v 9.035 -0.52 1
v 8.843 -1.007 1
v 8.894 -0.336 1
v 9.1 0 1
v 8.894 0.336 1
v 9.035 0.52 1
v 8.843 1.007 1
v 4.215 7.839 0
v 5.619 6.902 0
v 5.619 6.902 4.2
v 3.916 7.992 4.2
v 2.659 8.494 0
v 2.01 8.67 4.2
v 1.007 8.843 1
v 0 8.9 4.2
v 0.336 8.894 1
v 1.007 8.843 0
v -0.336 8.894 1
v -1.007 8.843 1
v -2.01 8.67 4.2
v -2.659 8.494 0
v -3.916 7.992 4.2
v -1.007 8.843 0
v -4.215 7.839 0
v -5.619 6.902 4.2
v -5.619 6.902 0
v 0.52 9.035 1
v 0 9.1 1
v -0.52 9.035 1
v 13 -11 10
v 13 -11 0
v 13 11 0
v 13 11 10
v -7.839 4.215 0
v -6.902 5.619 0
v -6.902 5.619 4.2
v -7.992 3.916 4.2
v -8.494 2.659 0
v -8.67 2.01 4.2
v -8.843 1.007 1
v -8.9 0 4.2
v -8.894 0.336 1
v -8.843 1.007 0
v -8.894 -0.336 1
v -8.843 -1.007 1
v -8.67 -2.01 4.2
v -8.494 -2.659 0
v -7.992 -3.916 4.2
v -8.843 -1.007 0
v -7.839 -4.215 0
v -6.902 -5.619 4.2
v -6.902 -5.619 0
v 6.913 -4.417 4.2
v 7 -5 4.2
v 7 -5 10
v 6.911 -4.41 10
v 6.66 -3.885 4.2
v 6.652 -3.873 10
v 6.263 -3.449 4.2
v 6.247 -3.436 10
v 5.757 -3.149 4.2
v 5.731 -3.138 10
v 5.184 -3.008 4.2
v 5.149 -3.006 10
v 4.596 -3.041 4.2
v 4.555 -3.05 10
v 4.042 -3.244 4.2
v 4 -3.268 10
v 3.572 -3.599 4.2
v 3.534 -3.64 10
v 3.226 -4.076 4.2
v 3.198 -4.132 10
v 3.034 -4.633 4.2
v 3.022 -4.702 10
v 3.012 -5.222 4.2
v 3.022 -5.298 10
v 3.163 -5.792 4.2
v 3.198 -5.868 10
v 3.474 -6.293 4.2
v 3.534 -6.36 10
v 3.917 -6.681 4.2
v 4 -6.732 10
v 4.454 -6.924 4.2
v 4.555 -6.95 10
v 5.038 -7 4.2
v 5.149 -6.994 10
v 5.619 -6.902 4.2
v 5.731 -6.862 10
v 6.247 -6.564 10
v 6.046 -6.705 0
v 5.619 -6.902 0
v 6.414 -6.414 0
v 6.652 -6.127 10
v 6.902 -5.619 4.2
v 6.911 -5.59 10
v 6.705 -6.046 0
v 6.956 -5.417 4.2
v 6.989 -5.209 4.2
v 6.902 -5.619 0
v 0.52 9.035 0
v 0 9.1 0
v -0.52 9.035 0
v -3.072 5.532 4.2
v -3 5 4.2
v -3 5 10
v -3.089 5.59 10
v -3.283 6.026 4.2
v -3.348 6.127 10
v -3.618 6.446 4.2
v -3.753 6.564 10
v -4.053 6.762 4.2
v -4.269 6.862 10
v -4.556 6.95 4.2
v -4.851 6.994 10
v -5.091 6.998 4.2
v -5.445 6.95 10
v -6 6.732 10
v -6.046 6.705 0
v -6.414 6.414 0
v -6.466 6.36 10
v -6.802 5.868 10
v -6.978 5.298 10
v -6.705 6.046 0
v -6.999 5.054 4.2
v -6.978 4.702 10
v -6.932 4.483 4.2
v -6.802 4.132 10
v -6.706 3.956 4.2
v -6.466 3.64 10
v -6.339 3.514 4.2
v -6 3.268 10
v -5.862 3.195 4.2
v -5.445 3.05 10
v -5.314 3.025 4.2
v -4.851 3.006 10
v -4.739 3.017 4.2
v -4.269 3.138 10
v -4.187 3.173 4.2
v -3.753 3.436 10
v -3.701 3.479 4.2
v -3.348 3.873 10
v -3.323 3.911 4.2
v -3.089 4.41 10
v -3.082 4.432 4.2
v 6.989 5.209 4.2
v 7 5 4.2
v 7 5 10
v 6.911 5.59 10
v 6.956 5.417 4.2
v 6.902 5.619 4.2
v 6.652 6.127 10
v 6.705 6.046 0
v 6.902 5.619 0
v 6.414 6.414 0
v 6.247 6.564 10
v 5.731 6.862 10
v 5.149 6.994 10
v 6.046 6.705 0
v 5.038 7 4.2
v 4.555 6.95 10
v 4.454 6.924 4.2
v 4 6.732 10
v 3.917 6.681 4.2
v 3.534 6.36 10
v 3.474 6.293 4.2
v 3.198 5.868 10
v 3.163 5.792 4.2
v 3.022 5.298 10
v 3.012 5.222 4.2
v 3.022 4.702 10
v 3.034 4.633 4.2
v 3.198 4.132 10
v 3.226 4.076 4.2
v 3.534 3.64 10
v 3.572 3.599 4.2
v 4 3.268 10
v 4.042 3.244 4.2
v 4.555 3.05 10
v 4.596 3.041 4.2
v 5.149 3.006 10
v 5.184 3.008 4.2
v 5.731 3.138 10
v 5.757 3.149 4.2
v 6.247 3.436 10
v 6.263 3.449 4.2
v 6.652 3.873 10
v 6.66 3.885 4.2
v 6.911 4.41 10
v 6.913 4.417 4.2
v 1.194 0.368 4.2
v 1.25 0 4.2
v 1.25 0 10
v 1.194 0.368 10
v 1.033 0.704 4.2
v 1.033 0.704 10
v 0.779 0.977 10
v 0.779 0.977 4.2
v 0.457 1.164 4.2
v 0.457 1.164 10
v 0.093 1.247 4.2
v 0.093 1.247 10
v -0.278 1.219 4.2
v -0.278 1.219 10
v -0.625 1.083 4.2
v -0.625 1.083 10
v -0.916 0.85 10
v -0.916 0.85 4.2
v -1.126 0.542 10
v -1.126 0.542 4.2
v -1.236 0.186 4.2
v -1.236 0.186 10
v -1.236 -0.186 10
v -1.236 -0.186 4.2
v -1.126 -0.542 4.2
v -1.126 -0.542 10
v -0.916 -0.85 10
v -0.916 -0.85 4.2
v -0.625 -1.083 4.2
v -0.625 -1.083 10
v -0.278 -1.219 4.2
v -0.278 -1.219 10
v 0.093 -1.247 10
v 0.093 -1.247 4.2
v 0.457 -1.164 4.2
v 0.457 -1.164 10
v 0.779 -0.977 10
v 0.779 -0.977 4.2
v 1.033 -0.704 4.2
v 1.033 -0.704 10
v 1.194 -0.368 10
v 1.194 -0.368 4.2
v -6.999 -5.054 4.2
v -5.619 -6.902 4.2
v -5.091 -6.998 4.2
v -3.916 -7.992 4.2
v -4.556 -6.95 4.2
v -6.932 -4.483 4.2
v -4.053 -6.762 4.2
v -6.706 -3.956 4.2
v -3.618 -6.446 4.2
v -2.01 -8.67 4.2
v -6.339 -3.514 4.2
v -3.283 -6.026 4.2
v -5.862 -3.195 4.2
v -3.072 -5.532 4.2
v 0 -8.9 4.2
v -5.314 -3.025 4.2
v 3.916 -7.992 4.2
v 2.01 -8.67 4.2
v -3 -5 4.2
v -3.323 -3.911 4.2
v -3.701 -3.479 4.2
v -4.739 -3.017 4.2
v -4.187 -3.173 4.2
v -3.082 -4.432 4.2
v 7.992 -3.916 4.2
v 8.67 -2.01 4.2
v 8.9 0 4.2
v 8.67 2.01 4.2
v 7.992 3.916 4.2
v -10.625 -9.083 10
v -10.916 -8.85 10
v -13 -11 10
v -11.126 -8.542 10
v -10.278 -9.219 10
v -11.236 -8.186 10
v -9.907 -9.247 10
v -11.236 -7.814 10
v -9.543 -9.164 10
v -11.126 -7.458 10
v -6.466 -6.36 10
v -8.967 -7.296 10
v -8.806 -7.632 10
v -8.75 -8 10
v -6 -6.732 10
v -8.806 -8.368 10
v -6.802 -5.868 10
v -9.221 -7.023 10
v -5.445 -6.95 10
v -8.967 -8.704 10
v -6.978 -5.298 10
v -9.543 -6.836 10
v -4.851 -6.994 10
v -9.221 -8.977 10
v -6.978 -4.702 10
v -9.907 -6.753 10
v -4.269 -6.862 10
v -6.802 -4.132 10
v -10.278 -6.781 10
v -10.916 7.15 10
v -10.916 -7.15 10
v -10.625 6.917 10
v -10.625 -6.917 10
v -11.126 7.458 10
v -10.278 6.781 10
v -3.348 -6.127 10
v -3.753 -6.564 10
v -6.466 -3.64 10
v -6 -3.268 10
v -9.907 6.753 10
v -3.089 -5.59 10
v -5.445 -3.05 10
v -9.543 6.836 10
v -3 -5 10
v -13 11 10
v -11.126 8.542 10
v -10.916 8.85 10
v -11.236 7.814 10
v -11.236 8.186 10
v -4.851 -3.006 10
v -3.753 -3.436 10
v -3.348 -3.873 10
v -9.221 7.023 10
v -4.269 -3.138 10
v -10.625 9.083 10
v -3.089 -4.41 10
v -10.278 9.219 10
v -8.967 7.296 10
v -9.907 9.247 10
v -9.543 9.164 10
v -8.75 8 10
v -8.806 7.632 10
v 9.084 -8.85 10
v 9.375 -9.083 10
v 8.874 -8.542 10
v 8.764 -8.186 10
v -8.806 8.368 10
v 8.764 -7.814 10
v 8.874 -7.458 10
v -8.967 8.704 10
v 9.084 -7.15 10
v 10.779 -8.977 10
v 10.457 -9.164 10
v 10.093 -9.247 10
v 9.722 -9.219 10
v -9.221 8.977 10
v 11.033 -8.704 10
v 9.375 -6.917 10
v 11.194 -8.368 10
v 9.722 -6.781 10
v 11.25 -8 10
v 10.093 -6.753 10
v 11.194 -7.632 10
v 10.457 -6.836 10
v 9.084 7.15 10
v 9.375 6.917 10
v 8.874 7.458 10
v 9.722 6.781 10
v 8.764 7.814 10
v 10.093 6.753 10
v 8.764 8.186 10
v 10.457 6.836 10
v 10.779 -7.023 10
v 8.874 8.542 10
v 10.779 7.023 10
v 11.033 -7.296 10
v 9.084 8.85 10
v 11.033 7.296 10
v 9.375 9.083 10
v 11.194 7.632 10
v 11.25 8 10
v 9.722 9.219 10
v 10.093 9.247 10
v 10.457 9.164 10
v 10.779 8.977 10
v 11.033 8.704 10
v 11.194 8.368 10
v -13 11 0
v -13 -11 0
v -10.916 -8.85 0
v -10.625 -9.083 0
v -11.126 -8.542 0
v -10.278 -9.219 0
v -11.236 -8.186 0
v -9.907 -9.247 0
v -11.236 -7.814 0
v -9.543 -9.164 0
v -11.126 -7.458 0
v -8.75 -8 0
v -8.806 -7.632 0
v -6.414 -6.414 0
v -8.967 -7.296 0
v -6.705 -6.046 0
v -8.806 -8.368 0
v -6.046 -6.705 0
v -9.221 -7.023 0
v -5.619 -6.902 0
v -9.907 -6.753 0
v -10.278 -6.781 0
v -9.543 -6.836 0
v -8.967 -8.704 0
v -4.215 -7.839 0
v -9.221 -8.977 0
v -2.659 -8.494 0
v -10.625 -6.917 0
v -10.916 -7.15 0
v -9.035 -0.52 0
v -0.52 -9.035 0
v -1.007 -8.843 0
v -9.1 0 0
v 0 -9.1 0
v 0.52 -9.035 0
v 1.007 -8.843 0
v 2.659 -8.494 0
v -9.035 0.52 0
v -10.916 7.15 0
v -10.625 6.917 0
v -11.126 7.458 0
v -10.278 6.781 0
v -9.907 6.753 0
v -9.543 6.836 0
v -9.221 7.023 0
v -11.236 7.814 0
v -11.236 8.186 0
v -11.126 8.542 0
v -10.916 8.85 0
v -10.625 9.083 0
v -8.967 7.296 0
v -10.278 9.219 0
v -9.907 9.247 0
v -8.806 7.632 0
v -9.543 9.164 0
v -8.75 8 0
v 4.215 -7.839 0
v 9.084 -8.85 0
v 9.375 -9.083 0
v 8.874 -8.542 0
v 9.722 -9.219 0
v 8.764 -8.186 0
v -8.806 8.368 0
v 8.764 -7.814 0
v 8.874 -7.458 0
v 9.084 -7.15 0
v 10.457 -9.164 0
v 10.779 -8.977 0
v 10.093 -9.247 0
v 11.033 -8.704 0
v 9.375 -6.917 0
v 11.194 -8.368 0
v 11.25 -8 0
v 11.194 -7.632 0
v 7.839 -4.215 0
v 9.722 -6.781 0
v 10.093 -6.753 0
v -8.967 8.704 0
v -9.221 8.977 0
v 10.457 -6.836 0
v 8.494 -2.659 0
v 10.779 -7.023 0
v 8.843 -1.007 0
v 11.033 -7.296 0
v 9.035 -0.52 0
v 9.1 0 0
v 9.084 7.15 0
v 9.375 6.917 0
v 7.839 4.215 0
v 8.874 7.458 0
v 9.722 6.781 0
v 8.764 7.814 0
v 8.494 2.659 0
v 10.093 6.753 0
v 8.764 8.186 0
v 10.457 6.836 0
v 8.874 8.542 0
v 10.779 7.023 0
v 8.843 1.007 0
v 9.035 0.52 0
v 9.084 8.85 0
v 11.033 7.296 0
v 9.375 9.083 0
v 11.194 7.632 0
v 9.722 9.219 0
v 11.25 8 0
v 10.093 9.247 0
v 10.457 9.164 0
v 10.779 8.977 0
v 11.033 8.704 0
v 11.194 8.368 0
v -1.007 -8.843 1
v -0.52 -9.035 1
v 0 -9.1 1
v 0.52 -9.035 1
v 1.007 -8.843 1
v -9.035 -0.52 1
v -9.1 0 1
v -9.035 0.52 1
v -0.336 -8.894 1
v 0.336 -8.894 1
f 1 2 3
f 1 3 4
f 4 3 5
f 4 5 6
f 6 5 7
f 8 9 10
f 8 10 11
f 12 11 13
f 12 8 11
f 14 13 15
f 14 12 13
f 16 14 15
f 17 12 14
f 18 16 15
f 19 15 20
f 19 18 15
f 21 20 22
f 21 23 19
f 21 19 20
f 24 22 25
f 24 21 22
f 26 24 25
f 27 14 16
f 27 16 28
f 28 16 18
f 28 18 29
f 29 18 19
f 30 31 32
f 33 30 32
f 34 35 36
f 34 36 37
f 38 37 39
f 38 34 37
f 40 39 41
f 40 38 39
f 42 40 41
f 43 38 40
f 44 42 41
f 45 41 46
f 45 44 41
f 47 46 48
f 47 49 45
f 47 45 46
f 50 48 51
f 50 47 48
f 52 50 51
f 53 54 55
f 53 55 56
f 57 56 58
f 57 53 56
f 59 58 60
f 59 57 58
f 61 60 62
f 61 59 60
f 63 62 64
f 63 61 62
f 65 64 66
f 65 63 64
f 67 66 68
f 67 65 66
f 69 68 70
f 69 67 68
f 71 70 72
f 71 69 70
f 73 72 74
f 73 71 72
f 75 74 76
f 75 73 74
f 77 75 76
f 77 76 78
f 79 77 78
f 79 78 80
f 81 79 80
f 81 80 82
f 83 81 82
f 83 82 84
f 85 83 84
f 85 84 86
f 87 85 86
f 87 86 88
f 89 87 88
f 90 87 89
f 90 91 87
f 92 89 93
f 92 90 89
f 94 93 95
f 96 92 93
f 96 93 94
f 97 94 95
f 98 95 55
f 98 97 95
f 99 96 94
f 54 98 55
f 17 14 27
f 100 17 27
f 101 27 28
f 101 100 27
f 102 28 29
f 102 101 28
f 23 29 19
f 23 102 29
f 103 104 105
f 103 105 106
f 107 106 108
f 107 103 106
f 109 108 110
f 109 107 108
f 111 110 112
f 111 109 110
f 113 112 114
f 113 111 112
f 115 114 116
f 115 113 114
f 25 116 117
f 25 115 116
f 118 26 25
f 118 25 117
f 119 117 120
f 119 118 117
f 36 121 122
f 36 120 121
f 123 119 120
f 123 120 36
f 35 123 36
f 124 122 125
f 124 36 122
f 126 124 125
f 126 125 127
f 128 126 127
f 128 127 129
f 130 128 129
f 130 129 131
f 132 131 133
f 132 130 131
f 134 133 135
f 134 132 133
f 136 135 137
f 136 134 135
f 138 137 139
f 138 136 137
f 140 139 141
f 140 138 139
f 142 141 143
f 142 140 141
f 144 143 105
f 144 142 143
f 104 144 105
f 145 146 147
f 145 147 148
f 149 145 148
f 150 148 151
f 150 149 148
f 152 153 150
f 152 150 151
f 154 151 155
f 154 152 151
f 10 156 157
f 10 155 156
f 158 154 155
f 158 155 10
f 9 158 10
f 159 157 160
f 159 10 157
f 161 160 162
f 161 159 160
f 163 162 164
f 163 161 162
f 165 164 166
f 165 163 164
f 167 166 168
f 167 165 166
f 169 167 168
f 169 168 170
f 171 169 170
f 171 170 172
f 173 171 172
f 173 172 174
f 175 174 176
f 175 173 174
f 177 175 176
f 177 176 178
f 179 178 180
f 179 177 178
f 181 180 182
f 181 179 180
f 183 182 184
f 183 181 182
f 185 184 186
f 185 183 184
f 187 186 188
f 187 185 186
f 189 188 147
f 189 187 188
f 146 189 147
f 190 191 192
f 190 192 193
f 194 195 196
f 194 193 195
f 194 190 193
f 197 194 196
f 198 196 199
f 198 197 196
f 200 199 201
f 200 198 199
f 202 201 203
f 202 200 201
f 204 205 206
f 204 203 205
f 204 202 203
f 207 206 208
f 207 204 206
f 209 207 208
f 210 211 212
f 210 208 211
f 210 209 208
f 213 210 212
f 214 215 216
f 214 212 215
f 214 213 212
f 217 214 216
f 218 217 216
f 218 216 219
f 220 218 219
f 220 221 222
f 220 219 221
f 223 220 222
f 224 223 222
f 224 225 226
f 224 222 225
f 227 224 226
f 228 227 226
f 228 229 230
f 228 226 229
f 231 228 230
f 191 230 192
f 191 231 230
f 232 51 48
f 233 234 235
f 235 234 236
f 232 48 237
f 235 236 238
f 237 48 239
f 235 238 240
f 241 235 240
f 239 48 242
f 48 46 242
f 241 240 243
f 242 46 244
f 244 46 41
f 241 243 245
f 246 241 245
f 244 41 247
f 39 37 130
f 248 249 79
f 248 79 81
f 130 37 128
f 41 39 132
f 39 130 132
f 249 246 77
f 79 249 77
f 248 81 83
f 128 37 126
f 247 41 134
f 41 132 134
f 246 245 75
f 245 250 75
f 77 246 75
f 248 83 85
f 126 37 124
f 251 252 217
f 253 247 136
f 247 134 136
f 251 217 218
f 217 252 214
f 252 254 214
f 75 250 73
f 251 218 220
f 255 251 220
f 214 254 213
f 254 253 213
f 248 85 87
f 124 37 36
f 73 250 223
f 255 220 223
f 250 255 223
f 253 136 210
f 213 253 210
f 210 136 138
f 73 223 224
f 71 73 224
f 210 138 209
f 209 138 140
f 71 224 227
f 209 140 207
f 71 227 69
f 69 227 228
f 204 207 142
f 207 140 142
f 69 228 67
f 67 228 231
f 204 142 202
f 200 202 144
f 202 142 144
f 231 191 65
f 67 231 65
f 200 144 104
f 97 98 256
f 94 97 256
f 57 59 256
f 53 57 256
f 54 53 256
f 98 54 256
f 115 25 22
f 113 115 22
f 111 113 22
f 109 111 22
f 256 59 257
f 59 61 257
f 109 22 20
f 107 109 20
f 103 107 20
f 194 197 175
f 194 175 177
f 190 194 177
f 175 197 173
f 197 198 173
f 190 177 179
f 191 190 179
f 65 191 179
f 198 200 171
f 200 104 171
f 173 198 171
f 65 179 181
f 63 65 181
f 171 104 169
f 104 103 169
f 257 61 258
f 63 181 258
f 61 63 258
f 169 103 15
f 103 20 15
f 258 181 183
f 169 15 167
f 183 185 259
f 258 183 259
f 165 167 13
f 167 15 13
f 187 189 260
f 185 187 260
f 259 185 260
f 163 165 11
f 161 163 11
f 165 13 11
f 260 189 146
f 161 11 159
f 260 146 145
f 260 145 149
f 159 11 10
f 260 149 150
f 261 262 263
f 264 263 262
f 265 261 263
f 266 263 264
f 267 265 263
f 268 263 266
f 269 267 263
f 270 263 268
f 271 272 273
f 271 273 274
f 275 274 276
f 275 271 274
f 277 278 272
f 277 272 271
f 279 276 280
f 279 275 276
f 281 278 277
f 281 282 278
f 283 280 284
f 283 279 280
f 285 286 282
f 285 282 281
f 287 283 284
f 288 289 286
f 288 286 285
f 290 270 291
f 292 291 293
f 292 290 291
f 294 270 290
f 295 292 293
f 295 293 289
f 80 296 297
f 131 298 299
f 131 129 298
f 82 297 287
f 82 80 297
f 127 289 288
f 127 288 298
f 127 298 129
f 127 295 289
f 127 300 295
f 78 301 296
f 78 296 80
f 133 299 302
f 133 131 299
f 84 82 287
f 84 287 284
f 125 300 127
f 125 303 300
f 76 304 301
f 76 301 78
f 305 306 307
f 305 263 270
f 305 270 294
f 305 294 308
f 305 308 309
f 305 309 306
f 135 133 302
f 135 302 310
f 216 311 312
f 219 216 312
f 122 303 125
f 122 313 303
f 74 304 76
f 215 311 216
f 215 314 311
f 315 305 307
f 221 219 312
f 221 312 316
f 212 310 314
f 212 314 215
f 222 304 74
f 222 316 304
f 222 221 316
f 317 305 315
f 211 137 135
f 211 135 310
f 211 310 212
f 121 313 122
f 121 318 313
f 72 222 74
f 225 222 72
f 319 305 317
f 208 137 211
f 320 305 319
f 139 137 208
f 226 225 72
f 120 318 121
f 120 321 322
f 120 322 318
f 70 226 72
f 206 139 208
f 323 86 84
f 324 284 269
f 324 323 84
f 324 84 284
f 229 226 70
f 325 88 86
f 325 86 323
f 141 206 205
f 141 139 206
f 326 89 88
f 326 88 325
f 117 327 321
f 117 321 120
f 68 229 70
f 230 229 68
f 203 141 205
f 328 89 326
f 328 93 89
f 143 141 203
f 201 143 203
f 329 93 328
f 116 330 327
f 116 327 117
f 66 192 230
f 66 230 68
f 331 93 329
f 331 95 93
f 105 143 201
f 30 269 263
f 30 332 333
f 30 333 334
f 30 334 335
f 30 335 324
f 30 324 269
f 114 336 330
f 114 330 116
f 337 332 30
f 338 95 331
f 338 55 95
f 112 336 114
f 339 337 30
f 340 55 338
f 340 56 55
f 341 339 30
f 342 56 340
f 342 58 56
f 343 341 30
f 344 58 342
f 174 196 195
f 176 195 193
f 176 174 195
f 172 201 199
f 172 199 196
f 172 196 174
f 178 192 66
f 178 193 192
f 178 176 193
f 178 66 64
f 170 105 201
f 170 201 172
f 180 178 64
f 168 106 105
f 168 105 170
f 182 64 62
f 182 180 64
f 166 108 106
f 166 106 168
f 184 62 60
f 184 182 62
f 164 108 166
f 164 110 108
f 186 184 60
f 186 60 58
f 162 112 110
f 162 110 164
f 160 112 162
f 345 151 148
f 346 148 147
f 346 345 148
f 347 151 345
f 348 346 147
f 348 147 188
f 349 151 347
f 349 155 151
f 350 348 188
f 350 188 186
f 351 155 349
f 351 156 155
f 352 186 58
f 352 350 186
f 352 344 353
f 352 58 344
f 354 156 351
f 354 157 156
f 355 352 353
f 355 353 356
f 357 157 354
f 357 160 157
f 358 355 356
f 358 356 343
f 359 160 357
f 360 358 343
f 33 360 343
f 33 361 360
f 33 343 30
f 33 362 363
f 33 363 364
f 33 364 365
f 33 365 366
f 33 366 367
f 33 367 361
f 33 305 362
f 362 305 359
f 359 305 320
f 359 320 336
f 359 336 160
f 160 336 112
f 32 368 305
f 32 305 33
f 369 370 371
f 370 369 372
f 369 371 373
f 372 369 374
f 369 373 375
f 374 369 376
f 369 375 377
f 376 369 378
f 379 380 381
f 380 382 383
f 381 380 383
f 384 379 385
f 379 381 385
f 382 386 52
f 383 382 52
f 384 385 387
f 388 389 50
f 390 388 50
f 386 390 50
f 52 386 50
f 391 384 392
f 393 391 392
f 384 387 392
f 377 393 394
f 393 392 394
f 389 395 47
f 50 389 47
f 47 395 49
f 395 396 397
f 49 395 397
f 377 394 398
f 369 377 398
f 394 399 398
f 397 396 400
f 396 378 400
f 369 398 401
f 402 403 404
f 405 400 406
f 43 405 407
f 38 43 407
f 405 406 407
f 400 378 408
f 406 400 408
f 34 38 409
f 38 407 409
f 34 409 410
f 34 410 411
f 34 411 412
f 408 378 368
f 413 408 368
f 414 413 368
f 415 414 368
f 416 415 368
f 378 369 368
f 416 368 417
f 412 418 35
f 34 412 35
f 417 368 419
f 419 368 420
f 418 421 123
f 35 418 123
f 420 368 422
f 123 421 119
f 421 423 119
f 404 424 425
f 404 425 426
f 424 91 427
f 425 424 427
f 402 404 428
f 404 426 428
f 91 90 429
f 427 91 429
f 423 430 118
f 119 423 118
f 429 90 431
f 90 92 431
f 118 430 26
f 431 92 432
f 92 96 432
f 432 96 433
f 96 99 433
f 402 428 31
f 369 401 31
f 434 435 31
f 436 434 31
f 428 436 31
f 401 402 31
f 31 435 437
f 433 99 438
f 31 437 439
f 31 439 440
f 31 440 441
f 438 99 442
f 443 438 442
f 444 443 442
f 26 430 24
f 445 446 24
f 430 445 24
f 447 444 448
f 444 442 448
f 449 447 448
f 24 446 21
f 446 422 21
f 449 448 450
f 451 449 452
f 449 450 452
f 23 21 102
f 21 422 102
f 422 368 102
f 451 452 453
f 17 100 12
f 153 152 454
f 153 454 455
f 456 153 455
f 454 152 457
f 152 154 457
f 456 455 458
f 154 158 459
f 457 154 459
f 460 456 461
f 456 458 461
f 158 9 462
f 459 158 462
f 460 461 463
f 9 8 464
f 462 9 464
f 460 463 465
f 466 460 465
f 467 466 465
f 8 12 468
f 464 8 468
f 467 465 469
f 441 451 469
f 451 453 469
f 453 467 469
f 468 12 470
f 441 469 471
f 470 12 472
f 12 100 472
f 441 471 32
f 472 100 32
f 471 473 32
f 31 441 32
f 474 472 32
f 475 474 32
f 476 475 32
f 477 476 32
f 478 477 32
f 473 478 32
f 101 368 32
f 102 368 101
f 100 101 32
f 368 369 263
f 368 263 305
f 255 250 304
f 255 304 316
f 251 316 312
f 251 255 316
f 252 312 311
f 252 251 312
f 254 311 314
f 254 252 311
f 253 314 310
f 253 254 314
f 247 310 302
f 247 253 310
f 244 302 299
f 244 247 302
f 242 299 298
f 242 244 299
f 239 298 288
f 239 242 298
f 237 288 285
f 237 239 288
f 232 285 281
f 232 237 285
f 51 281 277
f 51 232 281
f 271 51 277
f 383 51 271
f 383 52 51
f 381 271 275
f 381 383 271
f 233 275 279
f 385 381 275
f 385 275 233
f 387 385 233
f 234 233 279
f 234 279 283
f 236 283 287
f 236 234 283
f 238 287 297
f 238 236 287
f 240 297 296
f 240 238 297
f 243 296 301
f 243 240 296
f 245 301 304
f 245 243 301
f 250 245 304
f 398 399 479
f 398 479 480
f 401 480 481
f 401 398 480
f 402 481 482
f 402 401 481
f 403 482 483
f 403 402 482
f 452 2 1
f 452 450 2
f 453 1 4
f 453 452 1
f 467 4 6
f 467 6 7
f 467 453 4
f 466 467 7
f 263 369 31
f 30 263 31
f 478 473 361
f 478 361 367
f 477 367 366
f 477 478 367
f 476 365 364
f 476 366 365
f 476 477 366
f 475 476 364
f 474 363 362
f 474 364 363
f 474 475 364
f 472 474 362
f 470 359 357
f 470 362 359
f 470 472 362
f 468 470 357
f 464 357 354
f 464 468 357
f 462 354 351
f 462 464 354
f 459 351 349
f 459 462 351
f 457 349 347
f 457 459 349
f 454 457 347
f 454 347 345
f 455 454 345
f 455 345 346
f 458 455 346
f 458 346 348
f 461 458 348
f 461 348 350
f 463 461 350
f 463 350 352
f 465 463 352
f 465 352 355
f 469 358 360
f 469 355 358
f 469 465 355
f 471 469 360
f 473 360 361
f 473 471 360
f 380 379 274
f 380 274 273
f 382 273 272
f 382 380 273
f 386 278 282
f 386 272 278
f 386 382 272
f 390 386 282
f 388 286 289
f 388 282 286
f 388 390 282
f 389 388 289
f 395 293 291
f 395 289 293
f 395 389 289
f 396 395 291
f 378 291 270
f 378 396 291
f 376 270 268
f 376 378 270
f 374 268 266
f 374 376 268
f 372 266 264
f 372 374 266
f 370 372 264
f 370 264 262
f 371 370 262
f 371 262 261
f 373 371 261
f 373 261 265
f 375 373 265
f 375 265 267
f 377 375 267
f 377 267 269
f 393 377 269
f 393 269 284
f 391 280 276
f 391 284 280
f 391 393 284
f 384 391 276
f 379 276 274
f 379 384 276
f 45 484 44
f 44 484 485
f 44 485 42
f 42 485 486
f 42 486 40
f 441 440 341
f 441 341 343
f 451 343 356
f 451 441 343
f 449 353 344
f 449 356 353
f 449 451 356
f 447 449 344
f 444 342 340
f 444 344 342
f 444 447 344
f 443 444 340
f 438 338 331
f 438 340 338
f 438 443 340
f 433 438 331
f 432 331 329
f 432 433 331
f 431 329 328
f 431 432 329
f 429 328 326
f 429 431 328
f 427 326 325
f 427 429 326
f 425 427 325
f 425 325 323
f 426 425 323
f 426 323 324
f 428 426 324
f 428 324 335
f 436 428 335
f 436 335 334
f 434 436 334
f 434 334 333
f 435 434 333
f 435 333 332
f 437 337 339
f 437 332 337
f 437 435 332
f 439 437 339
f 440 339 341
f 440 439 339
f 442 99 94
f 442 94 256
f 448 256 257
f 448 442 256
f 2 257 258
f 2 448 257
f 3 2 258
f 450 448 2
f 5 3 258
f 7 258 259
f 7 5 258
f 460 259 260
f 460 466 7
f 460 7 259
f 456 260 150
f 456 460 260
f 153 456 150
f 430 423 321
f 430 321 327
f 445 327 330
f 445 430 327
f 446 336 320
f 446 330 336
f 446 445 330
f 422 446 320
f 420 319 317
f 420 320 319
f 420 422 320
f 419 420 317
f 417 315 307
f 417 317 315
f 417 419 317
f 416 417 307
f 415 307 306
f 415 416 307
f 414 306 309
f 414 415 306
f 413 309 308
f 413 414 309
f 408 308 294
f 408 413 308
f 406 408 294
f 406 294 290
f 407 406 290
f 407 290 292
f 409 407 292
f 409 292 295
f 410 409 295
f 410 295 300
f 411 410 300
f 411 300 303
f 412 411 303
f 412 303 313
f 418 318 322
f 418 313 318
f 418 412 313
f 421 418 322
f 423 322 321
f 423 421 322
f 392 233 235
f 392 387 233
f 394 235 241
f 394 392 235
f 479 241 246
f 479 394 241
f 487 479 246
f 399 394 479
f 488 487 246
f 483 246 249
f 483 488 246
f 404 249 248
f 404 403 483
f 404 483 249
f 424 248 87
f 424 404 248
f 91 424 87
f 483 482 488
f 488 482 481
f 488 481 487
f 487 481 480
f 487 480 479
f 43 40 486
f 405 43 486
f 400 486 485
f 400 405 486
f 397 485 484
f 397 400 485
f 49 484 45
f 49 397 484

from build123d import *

# Parameters (mm, degrees)
CYLINDER968_R             = 2.1
CYLINDER968_DEPTH         = 15
CYLINDER969_R             = 2.1
CYLINDER969_DEPTH         = 15
CYLINDER970_R             = 2.1
CYLINDER970_DEPTH         = 15
CYLINDER971_R             = 2.1
CYLINDER971_DEPTH         = 15
FUSION109_PLACEMENT_ANGLE = 90
CYLINDER965_R             = 2
CYLINDER965_DEPTH         = 15
CYLINDER967_R             = 2
CYLINDER967_DEPTH         = 15
CYLINDER966_R             = 2
CYLINDER966_DEPTH         = 15
CYLINDER964_R             = 2
CYLINDER964_DEPTH         = 15
CYLINDER958_R             = 1.25
CYLINDER958_DEPTH         = 15
CYLINDER957_R             = 1.25
CYLINDER957_DEPTH         = 15
CYLINDER956_R             = 1.25
CYLINDER956_DEPTH         = 15
CYLINDER955_R             = 1.25
CYLINDER955_DEPTH         = 15
CYLINDER070_R             = 8.9
CYLINDER070_DEPTH         = 4.2
CYLINDER072_R             = 1.25
CYLINDER072_DEPTH         = 12
BOX005_W                  = 26
BOX005_H                  = 22
BOX005_DEPTH              = 10


with BuildPart() as cylinder968:
    # Cylinder968 → Cylinder968 (new body)
    with BuildSketch(Plane(origin=(7, 0, 0), x_dir=(1, 0, 0), z_dir=(0, 0, 1))):
        Circle(CYLINDER968_R)
    extrude(amount=CYLINDER968_DEPTH)


with BuildPart() as fusion108:
    # Cylinder969 → Cylinder969 (new body)
    with BuildSketch(Plane(origin=(-7, 0, 0), x_dir=(1, 0, 0), z_dir=(0, 0, 1))):
        Circle(CYLINDER969_R)
    extrude(amount=CYLINDER969_DEPTH)

    # Fusion108: union Cylinder968
    add(cylinder968.part)


with BuildPart() as cylinder970:
    # Cylinder970 → Cylinder970 (new body)
    with BuildSketch(Plane(origin=(7, 0, 0), x_dir=(1, 0, 0), z_dir=(0, 0, 1))):
        Circle(CYLINDER970_R)
    extrude(amount=CYLINDER970_DEPTH)


with BuildPart() as fusion110:
    # Cylinder971 → Cylinder971 (new body)
    with BuildSketch(Plane(origin=(-7, 0, 0), x_dir=(1, 0, 0), z_dir=(0, 0, 1))):
        Circle(CYLINDER971_R)
    extrude(amount=CYLINDER971_DEPTH)

    # Fusion109: union Cylinder970
    add(cylinder970.part)


with BuildPart() as fusion110_1:
    # Fusion109 placement: moved
    add(fusion110.part.rotate(Axis((0, 0, 0), (0, 0, 1)), FUSION109_PLACEMENT_ANGLE))

    # Fusion110: union Fusion108
    add(fusion108.part)


with BuildPart() as fusion110_2:
    # Fusion110 placement: moved
    add(fusion110_1.part.moved(Location((0, 0, -14))))


with BuildPart() as cylinder965:
    # Cylinder965 → Cylinder965 (new body)
    with BuildSketch(Plane(origin=(5, 5, -2), x_dir=(1, 0, 0), z_dir=(0, 0, 1))):
        Circle(CYLINDER965_R)
    extrude(amount=CYLINDER965_DEPTH)


with BuildPart() as cylinder967:
    # Cylinder967 → Cylinder967 (new body)
    with BuildSketch(Plane(origin=(5, -5, -2), x_dir=(1, 0, 0), z_dir=(0, 0, 1))):
        Circle(CYLINDER967_R)
    extrude(amount=CYLINDER967_DEPTH)


with BuildPart() as cylinder966:
    # Cylinder966 → Cylinder966 (new body)
    with BuildSketch(Plane(origin=(-5, -5, -2), x_dir=(1, 0, 0), z_dir=(0, 0, 1))):
        Circle(CYLINDER966_R)
    extrude(amount=CYLINDER966_DEPTH)


with BuildPart() as fusion106:
    # Cylinder964 → Cylinder964 (new body)
    with BuildSketch(Plane(origin=(-5, 5, -2), x_dir=(1, 0, 0), z_dir=(0, 0, 1))):
        Circle(CYLINDER964_R)
    extrude(amount=CYLINDER964_DEPTH)

    # Fusion106: union Cylinder965, Cylinder967, Cylinder966
    add(cylinder965.part)
    add(cylinder967.part)
    add(cylinder966.part)


with BuildPart() as cylinder958:
    # Cylinder958 → Cylinder958 (new body)
    with BuildSketch(Plane(origin=(10, -8, -2), x_dir=(1, 0, 0), z_dir=(0, 0, 1))):
        Circle(CYLINDER958_R)
    extrude(amount=CYLINDER958_DEPTH)


with BuildPart() as cylinder957:
    # Cylinder957 → Cylinder957 (new body)
    with BuildSketch(Plane(origin=(10, 8, -2), x_dir=(1, 0, 0), z_dir=(0, 0, 1))):
        Circle(CYLINDER957_R)
    extrude(amount=CYLINDER957_DEPTH)


with BuildPart() as cylinder956:
    # Cylinder956 → Cylinder956 (new body)
    with BuildSketch(Plane(origin=(-10, -8, -2), x_dir=(1, 0, 0), z_dir=(0, 0, 1))):
        Circle(CYLINDER956_R)
    extrude(amount=CYLINDER956_DEPTH)


with BuildPart() as fusion104:
    # Cylinder955 → Cylinder955 (new body)
    with BuildSketch(Plane(origin=(-10, 8, -2), x_dir=(1, 0, 0), z_dir=(0, 0, 1))):
        Circle(CYLINDER955_R)
    extrude(amount=CYLINDER955_DEPTH)

    # Fusion104: union Cylinder958, Cylinder957, Cylinder956
    add(cylinder958.part)
    add(cylinder957.part)
    add(cylinder956.part)


with BuildPart() as cylinder070:
    # Cylinder070 → Cylinder070 (new body)
    with BuildSketch(Plane.XY):
        Circle(CYLINDER070_R)
    extrude(amount=CYLINDER070_DEPTH)


with BuildPart() as fusion036:
    # Cylinder072 → Cylinder072 (new body)
    with BuildSketch(Plane.XY):
        Circle(CYLINDER072_R)
    extrude(amount=CYLINDER072_DEPTH)

    # Fusion036: union Cylinder070
    add(cylinder070.part)


with BuildPart() as diff_lock_planetary_inf_holes:
    # Box005 → Box005 (new body)
    with BuildSketch(Plane(origin=(-13, -11, 0), x_dir=(1, 0, 0), z_dir=(0, 0, 1))):
        with Locations((13, 11)):
            Rectangle(BOX005_W, BOX005_H)
    extrude(amount=BOX005_DEPTH)

    # Cut014011: cut Fusion036
    add(fusion036.part, mode=Mode.SUBTRACT)

    # Cut014048: cut Fusion104
    add(fusion104.part, mode=Mode.SUBTRACT)

    # Cut014053: cut Fusion106
    add(fusion106.part, mode=Mode.SUBTRACT)

    # Cut014054: cut Fusion110
    add(fusion110_2.part, mode=Mode.SUBTRACT)


solid = diff_lock_planetary_inf_holes.part
